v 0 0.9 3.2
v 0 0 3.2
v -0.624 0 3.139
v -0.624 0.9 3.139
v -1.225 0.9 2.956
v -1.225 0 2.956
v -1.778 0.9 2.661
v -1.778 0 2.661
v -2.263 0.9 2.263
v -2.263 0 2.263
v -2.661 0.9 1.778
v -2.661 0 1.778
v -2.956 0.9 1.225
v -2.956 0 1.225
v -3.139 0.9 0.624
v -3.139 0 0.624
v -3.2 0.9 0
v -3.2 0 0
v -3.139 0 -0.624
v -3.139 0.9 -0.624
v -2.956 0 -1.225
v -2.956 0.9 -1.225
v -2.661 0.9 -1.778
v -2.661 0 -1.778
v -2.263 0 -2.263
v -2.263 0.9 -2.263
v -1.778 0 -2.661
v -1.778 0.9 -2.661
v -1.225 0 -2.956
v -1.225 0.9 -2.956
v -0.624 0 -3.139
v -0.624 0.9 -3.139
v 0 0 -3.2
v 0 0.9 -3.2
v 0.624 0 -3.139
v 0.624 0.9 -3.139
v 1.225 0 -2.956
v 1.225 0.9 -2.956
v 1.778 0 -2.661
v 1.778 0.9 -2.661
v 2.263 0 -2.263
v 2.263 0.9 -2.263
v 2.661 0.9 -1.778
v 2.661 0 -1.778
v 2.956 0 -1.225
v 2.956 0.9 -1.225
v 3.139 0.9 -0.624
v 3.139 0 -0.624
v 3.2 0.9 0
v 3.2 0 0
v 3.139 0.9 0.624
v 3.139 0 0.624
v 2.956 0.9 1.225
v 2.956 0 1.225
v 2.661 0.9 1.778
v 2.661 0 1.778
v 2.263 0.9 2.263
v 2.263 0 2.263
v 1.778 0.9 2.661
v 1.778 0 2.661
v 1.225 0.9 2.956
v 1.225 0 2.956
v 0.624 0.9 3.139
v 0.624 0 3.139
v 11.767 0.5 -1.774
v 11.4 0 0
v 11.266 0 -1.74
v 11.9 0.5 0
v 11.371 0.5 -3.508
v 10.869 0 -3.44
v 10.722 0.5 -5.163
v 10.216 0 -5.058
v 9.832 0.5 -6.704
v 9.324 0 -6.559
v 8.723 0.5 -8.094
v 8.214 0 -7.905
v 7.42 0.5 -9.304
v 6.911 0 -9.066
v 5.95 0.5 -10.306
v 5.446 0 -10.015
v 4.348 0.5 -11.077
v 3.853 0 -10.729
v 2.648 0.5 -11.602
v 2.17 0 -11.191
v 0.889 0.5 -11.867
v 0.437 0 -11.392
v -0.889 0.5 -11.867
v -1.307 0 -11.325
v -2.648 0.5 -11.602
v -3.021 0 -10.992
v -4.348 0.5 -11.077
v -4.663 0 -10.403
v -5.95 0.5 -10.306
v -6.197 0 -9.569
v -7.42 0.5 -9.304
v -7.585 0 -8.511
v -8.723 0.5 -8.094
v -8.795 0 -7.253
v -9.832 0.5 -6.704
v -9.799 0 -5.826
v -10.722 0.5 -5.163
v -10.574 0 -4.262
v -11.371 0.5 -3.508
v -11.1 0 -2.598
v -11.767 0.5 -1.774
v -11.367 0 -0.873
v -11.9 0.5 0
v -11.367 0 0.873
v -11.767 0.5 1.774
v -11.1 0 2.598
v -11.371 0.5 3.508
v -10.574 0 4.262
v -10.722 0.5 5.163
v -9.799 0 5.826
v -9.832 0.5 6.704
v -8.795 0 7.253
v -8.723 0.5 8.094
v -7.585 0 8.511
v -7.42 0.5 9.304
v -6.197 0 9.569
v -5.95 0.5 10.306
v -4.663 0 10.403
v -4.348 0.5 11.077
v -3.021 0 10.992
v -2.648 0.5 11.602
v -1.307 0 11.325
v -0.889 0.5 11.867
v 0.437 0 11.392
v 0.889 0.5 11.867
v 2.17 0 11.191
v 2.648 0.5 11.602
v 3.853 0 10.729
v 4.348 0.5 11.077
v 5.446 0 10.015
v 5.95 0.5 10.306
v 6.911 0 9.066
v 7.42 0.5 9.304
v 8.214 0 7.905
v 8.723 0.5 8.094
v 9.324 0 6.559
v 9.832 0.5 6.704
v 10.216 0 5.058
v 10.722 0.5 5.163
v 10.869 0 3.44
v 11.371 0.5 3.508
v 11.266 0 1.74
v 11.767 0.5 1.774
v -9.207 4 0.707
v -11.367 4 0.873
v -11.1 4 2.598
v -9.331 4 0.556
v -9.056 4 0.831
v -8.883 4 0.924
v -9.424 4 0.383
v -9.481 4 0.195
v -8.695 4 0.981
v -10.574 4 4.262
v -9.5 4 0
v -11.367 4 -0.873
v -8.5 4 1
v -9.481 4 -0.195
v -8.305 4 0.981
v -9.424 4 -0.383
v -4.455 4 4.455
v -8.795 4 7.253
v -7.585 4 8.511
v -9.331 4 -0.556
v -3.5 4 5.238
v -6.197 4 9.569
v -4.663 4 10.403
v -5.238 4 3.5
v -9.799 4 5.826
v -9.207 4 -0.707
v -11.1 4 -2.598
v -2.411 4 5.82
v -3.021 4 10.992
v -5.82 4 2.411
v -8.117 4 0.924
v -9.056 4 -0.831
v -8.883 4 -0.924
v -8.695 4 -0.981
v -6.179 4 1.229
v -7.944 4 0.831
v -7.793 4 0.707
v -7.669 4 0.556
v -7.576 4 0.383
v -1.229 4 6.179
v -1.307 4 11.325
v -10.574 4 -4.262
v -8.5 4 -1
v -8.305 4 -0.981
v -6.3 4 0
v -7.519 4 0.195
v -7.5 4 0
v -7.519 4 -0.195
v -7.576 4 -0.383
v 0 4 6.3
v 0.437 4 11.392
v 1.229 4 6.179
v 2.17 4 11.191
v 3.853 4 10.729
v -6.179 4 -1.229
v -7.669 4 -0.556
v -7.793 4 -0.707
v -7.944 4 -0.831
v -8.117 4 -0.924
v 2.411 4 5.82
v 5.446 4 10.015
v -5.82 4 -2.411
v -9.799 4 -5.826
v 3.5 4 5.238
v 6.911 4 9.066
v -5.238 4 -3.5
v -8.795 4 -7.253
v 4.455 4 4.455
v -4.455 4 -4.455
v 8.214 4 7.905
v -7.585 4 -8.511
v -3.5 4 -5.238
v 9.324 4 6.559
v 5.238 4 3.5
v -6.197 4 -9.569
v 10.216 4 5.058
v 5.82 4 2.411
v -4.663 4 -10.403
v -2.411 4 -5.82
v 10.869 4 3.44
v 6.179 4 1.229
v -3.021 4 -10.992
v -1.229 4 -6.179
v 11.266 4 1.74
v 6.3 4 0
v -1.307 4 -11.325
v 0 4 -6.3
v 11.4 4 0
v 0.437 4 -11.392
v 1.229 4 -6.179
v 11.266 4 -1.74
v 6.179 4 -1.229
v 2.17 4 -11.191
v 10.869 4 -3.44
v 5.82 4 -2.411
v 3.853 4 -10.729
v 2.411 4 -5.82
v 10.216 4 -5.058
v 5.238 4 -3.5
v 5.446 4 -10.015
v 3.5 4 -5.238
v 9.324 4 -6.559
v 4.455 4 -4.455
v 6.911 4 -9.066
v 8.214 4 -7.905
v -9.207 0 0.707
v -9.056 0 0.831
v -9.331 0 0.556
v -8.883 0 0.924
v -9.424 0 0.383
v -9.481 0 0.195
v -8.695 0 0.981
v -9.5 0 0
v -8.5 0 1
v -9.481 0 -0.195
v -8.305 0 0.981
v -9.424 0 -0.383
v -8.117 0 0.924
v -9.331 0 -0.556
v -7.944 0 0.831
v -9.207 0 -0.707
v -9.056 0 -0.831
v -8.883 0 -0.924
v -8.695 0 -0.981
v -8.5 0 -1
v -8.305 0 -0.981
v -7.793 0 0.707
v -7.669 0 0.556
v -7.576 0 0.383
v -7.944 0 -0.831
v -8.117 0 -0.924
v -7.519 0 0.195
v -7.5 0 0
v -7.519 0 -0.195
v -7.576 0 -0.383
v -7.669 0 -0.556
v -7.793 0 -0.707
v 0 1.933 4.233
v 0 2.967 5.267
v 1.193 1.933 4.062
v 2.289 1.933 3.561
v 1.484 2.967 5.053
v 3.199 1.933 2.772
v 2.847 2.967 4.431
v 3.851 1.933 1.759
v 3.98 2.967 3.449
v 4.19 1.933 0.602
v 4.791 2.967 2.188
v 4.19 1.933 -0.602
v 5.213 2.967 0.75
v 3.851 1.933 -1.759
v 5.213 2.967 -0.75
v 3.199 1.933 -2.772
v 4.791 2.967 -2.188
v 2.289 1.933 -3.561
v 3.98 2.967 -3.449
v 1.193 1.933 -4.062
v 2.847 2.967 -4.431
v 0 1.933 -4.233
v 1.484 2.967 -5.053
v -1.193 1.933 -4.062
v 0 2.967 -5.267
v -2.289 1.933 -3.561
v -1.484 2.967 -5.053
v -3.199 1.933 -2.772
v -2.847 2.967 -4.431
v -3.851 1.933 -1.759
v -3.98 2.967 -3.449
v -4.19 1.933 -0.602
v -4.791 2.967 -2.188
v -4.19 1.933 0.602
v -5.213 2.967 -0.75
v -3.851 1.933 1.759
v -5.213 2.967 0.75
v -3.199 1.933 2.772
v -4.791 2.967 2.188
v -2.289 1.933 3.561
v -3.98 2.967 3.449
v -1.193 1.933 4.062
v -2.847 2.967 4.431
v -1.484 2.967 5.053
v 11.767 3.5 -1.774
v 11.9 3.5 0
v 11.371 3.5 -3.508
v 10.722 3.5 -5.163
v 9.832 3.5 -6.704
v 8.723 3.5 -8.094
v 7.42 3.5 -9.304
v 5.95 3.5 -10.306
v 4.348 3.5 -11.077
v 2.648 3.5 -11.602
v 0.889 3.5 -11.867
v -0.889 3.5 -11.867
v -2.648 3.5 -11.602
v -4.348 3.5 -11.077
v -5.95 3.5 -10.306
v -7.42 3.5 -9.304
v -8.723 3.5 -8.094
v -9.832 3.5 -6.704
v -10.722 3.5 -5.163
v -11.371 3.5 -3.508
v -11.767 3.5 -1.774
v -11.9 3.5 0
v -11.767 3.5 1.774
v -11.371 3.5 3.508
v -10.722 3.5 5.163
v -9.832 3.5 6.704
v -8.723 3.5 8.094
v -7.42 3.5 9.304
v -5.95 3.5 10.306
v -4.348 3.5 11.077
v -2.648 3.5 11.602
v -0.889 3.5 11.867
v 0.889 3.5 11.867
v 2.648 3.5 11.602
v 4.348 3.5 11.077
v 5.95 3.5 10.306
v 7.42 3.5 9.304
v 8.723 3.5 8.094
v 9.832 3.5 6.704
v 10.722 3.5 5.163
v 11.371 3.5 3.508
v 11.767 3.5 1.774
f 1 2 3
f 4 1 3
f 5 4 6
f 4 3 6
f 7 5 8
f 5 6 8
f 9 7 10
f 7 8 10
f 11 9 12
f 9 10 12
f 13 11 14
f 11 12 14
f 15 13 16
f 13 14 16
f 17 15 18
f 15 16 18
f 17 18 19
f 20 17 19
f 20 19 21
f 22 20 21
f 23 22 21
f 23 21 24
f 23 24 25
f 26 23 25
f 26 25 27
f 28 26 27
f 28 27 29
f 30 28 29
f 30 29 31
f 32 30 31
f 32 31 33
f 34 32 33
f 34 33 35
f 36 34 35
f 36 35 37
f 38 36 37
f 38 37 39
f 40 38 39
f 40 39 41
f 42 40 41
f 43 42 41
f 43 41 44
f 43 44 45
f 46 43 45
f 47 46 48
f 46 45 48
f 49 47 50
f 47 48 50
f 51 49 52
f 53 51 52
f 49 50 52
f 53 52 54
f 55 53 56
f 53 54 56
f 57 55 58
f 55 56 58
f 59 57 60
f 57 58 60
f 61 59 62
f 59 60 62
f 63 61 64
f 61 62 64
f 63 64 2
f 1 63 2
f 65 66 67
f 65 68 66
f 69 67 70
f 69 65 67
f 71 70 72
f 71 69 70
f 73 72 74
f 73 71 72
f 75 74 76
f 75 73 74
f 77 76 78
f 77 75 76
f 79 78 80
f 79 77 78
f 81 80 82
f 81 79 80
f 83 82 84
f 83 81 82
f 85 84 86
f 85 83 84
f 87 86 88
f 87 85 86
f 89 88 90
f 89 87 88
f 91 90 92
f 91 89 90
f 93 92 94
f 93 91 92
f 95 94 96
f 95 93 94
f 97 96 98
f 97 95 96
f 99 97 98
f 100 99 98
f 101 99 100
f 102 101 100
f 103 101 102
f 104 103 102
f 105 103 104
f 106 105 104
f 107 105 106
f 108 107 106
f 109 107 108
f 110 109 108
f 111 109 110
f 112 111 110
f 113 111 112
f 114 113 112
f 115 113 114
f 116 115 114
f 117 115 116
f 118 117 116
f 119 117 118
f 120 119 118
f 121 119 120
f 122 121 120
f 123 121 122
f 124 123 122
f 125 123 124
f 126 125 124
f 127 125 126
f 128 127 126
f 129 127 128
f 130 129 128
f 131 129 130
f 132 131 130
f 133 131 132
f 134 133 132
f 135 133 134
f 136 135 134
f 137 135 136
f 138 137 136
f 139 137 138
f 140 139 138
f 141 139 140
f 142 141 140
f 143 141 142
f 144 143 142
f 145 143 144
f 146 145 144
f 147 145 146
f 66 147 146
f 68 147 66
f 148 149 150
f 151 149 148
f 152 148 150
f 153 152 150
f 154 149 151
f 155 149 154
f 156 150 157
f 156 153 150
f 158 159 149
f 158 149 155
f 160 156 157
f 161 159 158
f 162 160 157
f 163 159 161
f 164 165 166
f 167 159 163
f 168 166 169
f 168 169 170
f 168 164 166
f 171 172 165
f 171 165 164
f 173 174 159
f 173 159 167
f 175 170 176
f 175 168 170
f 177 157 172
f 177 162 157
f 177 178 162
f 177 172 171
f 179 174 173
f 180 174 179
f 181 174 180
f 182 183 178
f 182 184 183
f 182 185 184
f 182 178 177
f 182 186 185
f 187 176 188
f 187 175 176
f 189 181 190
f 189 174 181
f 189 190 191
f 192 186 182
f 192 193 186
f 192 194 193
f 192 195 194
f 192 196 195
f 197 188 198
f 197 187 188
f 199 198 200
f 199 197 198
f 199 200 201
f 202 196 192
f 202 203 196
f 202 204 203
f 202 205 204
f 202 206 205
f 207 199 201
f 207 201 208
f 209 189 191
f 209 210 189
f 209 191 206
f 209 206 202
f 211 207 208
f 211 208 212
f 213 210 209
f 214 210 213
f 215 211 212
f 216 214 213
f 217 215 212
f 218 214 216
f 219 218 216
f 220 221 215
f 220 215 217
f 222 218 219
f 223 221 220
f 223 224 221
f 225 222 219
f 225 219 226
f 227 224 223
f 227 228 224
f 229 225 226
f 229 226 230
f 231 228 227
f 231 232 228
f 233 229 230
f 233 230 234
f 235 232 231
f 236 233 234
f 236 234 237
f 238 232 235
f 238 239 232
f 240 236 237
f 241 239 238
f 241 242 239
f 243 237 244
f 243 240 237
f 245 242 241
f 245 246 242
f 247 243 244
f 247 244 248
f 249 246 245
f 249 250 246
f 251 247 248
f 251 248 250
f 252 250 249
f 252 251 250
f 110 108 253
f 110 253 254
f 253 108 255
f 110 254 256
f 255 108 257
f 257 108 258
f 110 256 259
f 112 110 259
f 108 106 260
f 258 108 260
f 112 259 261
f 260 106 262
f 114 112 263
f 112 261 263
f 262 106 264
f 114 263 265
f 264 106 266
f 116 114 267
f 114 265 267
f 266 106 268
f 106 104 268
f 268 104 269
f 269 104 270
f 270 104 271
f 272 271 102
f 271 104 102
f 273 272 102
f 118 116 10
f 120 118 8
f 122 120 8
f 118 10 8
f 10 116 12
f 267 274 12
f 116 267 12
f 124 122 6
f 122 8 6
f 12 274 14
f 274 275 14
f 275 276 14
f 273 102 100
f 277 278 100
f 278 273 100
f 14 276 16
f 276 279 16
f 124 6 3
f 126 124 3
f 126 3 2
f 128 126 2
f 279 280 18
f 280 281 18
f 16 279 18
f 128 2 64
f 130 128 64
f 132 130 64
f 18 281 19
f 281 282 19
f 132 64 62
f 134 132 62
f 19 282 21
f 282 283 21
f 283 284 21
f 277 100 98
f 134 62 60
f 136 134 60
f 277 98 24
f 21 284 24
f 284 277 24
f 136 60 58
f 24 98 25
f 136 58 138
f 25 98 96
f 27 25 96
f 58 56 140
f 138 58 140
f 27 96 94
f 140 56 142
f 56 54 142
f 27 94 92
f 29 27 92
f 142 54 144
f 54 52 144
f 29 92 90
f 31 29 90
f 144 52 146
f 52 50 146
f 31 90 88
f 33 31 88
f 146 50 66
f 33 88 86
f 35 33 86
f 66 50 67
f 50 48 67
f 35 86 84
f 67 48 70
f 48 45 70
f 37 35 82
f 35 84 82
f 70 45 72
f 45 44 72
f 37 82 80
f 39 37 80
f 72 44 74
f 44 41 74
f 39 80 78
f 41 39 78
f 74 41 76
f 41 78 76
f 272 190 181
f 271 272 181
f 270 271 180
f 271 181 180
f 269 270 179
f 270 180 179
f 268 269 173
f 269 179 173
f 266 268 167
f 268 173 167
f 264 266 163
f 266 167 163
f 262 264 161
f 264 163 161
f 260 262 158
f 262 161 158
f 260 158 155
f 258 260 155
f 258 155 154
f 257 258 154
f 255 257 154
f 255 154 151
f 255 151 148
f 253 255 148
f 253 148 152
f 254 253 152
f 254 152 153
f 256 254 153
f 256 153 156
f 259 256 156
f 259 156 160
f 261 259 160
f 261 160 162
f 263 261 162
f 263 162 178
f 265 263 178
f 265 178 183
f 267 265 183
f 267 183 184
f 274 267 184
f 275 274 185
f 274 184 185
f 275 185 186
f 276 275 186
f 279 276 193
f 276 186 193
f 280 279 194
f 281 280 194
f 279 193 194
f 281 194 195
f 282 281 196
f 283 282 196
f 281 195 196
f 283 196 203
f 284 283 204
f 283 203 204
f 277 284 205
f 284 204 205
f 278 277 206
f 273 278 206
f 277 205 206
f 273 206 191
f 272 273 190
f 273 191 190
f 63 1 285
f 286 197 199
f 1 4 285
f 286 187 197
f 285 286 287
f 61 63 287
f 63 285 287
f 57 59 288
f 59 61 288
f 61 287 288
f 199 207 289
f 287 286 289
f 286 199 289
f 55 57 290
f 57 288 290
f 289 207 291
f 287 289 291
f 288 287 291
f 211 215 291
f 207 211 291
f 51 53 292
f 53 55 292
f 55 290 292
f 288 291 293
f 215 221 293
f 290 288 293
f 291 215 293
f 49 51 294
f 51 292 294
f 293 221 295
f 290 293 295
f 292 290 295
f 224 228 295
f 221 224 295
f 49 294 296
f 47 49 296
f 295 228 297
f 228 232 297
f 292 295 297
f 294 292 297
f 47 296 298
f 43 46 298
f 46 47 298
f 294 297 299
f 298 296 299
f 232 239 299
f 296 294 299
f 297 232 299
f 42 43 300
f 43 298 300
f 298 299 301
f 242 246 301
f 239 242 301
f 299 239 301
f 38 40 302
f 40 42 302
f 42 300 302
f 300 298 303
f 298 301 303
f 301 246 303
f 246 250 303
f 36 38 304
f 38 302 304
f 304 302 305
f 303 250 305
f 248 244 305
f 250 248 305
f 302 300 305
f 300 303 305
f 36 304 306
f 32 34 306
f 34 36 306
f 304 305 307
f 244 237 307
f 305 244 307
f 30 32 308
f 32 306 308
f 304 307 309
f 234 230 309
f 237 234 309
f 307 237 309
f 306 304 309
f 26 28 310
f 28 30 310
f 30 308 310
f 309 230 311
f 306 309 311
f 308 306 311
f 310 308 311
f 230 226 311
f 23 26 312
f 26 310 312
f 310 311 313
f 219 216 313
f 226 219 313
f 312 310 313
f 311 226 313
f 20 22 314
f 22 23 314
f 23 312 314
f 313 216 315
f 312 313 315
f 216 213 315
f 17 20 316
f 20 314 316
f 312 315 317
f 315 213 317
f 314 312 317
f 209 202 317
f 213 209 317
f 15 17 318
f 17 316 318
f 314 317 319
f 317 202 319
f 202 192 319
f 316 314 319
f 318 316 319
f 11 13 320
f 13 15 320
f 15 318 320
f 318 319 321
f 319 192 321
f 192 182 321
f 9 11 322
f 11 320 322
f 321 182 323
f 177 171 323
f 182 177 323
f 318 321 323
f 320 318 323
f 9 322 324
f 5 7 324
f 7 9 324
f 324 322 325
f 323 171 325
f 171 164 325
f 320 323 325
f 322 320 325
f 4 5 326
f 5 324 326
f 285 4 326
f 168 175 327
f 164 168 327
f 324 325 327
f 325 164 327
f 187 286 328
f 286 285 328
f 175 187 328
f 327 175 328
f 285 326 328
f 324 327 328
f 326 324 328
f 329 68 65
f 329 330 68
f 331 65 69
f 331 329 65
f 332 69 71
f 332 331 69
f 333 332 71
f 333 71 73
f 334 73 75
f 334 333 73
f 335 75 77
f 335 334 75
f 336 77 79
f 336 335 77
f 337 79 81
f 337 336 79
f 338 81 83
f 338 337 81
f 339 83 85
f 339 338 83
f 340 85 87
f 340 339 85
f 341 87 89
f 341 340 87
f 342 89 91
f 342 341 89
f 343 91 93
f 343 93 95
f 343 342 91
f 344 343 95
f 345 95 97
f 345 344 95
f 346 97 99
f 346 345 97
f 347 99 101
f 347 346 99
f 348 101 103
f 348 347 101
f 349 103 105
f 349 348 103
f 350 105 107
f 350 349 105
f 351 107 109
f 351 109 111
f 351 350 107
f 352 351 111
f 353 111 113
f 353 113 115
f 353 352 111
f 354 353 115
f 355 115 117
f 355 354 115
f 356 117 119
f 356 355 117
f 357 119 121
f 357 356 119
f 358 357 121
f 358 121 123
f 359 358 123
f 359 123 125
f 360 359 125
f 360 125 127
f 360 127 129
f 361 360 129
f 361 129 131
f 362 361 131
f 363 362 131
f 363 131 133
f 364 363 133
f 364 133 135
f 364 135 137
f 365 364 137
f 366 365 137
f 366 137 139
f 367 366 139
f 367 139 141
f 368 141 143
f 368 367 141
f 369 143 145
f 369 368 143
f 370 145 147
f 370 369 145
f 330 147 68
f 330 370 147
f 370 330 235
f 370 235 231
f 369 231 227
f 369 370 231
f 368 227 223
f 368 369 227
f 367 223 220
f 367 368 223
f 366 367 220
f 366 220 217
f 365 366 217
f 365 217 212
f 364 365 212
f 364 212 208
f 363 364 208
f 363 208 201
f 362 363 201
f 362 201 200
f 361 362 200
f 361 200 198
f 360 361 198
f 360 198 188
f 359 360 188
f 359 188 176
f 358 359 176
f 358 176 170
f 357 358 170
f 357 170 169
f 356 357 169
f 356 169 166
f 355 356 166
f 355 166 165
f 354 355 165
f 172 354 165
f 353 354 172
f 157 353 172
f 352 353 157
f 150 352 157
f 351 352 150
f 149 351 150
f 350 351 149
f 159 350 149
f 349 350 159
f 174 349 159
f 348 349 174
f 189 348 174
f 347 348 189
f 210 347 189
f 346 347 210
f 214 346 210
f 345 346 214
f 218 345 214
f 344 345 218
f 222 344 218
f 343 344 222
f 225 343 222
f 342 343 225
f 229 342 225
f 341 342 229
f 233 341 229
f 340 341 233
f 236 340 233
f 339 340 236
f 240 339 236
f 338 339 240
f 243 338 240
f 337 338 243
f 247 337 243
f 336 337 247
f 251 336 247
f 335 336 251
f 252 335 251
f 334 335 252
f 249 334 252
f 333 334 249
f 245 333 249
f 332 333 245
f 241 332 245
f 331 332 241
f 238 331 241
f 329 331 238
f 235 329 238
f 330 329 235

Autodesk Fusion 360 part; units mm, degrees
cylinder "CylinderPrimitive1" add diameter 23.8 height 4 placed x (1, 0, 0) y (0, 0, -1) z (0, 1, 0) at (0, 0, 0)
hole "Hole1" at (0, 4, 0) direction (0, -1, 0) diameter 6.4 end through all countersink diameter 12.6 countersink angle 90
chamfer "Chamfer1" distance 0.5 angle 45 2 edges at (-11.0947, 4, 4.3032) (-11.0947, 0, -4.3032)
sketch "Sketch4" plane through (0, 0, 0) normal (0, 1, 0) x (1, 0, 0)
  circle A0 centre (0, 0) radius 8.5 construction
  point P0 (-8.5, 0)
  dimension "d9" = 17
hole "Hole2" at (-8.5, 0, 0) direction (0, 1, 0) diameter 2 end through all
